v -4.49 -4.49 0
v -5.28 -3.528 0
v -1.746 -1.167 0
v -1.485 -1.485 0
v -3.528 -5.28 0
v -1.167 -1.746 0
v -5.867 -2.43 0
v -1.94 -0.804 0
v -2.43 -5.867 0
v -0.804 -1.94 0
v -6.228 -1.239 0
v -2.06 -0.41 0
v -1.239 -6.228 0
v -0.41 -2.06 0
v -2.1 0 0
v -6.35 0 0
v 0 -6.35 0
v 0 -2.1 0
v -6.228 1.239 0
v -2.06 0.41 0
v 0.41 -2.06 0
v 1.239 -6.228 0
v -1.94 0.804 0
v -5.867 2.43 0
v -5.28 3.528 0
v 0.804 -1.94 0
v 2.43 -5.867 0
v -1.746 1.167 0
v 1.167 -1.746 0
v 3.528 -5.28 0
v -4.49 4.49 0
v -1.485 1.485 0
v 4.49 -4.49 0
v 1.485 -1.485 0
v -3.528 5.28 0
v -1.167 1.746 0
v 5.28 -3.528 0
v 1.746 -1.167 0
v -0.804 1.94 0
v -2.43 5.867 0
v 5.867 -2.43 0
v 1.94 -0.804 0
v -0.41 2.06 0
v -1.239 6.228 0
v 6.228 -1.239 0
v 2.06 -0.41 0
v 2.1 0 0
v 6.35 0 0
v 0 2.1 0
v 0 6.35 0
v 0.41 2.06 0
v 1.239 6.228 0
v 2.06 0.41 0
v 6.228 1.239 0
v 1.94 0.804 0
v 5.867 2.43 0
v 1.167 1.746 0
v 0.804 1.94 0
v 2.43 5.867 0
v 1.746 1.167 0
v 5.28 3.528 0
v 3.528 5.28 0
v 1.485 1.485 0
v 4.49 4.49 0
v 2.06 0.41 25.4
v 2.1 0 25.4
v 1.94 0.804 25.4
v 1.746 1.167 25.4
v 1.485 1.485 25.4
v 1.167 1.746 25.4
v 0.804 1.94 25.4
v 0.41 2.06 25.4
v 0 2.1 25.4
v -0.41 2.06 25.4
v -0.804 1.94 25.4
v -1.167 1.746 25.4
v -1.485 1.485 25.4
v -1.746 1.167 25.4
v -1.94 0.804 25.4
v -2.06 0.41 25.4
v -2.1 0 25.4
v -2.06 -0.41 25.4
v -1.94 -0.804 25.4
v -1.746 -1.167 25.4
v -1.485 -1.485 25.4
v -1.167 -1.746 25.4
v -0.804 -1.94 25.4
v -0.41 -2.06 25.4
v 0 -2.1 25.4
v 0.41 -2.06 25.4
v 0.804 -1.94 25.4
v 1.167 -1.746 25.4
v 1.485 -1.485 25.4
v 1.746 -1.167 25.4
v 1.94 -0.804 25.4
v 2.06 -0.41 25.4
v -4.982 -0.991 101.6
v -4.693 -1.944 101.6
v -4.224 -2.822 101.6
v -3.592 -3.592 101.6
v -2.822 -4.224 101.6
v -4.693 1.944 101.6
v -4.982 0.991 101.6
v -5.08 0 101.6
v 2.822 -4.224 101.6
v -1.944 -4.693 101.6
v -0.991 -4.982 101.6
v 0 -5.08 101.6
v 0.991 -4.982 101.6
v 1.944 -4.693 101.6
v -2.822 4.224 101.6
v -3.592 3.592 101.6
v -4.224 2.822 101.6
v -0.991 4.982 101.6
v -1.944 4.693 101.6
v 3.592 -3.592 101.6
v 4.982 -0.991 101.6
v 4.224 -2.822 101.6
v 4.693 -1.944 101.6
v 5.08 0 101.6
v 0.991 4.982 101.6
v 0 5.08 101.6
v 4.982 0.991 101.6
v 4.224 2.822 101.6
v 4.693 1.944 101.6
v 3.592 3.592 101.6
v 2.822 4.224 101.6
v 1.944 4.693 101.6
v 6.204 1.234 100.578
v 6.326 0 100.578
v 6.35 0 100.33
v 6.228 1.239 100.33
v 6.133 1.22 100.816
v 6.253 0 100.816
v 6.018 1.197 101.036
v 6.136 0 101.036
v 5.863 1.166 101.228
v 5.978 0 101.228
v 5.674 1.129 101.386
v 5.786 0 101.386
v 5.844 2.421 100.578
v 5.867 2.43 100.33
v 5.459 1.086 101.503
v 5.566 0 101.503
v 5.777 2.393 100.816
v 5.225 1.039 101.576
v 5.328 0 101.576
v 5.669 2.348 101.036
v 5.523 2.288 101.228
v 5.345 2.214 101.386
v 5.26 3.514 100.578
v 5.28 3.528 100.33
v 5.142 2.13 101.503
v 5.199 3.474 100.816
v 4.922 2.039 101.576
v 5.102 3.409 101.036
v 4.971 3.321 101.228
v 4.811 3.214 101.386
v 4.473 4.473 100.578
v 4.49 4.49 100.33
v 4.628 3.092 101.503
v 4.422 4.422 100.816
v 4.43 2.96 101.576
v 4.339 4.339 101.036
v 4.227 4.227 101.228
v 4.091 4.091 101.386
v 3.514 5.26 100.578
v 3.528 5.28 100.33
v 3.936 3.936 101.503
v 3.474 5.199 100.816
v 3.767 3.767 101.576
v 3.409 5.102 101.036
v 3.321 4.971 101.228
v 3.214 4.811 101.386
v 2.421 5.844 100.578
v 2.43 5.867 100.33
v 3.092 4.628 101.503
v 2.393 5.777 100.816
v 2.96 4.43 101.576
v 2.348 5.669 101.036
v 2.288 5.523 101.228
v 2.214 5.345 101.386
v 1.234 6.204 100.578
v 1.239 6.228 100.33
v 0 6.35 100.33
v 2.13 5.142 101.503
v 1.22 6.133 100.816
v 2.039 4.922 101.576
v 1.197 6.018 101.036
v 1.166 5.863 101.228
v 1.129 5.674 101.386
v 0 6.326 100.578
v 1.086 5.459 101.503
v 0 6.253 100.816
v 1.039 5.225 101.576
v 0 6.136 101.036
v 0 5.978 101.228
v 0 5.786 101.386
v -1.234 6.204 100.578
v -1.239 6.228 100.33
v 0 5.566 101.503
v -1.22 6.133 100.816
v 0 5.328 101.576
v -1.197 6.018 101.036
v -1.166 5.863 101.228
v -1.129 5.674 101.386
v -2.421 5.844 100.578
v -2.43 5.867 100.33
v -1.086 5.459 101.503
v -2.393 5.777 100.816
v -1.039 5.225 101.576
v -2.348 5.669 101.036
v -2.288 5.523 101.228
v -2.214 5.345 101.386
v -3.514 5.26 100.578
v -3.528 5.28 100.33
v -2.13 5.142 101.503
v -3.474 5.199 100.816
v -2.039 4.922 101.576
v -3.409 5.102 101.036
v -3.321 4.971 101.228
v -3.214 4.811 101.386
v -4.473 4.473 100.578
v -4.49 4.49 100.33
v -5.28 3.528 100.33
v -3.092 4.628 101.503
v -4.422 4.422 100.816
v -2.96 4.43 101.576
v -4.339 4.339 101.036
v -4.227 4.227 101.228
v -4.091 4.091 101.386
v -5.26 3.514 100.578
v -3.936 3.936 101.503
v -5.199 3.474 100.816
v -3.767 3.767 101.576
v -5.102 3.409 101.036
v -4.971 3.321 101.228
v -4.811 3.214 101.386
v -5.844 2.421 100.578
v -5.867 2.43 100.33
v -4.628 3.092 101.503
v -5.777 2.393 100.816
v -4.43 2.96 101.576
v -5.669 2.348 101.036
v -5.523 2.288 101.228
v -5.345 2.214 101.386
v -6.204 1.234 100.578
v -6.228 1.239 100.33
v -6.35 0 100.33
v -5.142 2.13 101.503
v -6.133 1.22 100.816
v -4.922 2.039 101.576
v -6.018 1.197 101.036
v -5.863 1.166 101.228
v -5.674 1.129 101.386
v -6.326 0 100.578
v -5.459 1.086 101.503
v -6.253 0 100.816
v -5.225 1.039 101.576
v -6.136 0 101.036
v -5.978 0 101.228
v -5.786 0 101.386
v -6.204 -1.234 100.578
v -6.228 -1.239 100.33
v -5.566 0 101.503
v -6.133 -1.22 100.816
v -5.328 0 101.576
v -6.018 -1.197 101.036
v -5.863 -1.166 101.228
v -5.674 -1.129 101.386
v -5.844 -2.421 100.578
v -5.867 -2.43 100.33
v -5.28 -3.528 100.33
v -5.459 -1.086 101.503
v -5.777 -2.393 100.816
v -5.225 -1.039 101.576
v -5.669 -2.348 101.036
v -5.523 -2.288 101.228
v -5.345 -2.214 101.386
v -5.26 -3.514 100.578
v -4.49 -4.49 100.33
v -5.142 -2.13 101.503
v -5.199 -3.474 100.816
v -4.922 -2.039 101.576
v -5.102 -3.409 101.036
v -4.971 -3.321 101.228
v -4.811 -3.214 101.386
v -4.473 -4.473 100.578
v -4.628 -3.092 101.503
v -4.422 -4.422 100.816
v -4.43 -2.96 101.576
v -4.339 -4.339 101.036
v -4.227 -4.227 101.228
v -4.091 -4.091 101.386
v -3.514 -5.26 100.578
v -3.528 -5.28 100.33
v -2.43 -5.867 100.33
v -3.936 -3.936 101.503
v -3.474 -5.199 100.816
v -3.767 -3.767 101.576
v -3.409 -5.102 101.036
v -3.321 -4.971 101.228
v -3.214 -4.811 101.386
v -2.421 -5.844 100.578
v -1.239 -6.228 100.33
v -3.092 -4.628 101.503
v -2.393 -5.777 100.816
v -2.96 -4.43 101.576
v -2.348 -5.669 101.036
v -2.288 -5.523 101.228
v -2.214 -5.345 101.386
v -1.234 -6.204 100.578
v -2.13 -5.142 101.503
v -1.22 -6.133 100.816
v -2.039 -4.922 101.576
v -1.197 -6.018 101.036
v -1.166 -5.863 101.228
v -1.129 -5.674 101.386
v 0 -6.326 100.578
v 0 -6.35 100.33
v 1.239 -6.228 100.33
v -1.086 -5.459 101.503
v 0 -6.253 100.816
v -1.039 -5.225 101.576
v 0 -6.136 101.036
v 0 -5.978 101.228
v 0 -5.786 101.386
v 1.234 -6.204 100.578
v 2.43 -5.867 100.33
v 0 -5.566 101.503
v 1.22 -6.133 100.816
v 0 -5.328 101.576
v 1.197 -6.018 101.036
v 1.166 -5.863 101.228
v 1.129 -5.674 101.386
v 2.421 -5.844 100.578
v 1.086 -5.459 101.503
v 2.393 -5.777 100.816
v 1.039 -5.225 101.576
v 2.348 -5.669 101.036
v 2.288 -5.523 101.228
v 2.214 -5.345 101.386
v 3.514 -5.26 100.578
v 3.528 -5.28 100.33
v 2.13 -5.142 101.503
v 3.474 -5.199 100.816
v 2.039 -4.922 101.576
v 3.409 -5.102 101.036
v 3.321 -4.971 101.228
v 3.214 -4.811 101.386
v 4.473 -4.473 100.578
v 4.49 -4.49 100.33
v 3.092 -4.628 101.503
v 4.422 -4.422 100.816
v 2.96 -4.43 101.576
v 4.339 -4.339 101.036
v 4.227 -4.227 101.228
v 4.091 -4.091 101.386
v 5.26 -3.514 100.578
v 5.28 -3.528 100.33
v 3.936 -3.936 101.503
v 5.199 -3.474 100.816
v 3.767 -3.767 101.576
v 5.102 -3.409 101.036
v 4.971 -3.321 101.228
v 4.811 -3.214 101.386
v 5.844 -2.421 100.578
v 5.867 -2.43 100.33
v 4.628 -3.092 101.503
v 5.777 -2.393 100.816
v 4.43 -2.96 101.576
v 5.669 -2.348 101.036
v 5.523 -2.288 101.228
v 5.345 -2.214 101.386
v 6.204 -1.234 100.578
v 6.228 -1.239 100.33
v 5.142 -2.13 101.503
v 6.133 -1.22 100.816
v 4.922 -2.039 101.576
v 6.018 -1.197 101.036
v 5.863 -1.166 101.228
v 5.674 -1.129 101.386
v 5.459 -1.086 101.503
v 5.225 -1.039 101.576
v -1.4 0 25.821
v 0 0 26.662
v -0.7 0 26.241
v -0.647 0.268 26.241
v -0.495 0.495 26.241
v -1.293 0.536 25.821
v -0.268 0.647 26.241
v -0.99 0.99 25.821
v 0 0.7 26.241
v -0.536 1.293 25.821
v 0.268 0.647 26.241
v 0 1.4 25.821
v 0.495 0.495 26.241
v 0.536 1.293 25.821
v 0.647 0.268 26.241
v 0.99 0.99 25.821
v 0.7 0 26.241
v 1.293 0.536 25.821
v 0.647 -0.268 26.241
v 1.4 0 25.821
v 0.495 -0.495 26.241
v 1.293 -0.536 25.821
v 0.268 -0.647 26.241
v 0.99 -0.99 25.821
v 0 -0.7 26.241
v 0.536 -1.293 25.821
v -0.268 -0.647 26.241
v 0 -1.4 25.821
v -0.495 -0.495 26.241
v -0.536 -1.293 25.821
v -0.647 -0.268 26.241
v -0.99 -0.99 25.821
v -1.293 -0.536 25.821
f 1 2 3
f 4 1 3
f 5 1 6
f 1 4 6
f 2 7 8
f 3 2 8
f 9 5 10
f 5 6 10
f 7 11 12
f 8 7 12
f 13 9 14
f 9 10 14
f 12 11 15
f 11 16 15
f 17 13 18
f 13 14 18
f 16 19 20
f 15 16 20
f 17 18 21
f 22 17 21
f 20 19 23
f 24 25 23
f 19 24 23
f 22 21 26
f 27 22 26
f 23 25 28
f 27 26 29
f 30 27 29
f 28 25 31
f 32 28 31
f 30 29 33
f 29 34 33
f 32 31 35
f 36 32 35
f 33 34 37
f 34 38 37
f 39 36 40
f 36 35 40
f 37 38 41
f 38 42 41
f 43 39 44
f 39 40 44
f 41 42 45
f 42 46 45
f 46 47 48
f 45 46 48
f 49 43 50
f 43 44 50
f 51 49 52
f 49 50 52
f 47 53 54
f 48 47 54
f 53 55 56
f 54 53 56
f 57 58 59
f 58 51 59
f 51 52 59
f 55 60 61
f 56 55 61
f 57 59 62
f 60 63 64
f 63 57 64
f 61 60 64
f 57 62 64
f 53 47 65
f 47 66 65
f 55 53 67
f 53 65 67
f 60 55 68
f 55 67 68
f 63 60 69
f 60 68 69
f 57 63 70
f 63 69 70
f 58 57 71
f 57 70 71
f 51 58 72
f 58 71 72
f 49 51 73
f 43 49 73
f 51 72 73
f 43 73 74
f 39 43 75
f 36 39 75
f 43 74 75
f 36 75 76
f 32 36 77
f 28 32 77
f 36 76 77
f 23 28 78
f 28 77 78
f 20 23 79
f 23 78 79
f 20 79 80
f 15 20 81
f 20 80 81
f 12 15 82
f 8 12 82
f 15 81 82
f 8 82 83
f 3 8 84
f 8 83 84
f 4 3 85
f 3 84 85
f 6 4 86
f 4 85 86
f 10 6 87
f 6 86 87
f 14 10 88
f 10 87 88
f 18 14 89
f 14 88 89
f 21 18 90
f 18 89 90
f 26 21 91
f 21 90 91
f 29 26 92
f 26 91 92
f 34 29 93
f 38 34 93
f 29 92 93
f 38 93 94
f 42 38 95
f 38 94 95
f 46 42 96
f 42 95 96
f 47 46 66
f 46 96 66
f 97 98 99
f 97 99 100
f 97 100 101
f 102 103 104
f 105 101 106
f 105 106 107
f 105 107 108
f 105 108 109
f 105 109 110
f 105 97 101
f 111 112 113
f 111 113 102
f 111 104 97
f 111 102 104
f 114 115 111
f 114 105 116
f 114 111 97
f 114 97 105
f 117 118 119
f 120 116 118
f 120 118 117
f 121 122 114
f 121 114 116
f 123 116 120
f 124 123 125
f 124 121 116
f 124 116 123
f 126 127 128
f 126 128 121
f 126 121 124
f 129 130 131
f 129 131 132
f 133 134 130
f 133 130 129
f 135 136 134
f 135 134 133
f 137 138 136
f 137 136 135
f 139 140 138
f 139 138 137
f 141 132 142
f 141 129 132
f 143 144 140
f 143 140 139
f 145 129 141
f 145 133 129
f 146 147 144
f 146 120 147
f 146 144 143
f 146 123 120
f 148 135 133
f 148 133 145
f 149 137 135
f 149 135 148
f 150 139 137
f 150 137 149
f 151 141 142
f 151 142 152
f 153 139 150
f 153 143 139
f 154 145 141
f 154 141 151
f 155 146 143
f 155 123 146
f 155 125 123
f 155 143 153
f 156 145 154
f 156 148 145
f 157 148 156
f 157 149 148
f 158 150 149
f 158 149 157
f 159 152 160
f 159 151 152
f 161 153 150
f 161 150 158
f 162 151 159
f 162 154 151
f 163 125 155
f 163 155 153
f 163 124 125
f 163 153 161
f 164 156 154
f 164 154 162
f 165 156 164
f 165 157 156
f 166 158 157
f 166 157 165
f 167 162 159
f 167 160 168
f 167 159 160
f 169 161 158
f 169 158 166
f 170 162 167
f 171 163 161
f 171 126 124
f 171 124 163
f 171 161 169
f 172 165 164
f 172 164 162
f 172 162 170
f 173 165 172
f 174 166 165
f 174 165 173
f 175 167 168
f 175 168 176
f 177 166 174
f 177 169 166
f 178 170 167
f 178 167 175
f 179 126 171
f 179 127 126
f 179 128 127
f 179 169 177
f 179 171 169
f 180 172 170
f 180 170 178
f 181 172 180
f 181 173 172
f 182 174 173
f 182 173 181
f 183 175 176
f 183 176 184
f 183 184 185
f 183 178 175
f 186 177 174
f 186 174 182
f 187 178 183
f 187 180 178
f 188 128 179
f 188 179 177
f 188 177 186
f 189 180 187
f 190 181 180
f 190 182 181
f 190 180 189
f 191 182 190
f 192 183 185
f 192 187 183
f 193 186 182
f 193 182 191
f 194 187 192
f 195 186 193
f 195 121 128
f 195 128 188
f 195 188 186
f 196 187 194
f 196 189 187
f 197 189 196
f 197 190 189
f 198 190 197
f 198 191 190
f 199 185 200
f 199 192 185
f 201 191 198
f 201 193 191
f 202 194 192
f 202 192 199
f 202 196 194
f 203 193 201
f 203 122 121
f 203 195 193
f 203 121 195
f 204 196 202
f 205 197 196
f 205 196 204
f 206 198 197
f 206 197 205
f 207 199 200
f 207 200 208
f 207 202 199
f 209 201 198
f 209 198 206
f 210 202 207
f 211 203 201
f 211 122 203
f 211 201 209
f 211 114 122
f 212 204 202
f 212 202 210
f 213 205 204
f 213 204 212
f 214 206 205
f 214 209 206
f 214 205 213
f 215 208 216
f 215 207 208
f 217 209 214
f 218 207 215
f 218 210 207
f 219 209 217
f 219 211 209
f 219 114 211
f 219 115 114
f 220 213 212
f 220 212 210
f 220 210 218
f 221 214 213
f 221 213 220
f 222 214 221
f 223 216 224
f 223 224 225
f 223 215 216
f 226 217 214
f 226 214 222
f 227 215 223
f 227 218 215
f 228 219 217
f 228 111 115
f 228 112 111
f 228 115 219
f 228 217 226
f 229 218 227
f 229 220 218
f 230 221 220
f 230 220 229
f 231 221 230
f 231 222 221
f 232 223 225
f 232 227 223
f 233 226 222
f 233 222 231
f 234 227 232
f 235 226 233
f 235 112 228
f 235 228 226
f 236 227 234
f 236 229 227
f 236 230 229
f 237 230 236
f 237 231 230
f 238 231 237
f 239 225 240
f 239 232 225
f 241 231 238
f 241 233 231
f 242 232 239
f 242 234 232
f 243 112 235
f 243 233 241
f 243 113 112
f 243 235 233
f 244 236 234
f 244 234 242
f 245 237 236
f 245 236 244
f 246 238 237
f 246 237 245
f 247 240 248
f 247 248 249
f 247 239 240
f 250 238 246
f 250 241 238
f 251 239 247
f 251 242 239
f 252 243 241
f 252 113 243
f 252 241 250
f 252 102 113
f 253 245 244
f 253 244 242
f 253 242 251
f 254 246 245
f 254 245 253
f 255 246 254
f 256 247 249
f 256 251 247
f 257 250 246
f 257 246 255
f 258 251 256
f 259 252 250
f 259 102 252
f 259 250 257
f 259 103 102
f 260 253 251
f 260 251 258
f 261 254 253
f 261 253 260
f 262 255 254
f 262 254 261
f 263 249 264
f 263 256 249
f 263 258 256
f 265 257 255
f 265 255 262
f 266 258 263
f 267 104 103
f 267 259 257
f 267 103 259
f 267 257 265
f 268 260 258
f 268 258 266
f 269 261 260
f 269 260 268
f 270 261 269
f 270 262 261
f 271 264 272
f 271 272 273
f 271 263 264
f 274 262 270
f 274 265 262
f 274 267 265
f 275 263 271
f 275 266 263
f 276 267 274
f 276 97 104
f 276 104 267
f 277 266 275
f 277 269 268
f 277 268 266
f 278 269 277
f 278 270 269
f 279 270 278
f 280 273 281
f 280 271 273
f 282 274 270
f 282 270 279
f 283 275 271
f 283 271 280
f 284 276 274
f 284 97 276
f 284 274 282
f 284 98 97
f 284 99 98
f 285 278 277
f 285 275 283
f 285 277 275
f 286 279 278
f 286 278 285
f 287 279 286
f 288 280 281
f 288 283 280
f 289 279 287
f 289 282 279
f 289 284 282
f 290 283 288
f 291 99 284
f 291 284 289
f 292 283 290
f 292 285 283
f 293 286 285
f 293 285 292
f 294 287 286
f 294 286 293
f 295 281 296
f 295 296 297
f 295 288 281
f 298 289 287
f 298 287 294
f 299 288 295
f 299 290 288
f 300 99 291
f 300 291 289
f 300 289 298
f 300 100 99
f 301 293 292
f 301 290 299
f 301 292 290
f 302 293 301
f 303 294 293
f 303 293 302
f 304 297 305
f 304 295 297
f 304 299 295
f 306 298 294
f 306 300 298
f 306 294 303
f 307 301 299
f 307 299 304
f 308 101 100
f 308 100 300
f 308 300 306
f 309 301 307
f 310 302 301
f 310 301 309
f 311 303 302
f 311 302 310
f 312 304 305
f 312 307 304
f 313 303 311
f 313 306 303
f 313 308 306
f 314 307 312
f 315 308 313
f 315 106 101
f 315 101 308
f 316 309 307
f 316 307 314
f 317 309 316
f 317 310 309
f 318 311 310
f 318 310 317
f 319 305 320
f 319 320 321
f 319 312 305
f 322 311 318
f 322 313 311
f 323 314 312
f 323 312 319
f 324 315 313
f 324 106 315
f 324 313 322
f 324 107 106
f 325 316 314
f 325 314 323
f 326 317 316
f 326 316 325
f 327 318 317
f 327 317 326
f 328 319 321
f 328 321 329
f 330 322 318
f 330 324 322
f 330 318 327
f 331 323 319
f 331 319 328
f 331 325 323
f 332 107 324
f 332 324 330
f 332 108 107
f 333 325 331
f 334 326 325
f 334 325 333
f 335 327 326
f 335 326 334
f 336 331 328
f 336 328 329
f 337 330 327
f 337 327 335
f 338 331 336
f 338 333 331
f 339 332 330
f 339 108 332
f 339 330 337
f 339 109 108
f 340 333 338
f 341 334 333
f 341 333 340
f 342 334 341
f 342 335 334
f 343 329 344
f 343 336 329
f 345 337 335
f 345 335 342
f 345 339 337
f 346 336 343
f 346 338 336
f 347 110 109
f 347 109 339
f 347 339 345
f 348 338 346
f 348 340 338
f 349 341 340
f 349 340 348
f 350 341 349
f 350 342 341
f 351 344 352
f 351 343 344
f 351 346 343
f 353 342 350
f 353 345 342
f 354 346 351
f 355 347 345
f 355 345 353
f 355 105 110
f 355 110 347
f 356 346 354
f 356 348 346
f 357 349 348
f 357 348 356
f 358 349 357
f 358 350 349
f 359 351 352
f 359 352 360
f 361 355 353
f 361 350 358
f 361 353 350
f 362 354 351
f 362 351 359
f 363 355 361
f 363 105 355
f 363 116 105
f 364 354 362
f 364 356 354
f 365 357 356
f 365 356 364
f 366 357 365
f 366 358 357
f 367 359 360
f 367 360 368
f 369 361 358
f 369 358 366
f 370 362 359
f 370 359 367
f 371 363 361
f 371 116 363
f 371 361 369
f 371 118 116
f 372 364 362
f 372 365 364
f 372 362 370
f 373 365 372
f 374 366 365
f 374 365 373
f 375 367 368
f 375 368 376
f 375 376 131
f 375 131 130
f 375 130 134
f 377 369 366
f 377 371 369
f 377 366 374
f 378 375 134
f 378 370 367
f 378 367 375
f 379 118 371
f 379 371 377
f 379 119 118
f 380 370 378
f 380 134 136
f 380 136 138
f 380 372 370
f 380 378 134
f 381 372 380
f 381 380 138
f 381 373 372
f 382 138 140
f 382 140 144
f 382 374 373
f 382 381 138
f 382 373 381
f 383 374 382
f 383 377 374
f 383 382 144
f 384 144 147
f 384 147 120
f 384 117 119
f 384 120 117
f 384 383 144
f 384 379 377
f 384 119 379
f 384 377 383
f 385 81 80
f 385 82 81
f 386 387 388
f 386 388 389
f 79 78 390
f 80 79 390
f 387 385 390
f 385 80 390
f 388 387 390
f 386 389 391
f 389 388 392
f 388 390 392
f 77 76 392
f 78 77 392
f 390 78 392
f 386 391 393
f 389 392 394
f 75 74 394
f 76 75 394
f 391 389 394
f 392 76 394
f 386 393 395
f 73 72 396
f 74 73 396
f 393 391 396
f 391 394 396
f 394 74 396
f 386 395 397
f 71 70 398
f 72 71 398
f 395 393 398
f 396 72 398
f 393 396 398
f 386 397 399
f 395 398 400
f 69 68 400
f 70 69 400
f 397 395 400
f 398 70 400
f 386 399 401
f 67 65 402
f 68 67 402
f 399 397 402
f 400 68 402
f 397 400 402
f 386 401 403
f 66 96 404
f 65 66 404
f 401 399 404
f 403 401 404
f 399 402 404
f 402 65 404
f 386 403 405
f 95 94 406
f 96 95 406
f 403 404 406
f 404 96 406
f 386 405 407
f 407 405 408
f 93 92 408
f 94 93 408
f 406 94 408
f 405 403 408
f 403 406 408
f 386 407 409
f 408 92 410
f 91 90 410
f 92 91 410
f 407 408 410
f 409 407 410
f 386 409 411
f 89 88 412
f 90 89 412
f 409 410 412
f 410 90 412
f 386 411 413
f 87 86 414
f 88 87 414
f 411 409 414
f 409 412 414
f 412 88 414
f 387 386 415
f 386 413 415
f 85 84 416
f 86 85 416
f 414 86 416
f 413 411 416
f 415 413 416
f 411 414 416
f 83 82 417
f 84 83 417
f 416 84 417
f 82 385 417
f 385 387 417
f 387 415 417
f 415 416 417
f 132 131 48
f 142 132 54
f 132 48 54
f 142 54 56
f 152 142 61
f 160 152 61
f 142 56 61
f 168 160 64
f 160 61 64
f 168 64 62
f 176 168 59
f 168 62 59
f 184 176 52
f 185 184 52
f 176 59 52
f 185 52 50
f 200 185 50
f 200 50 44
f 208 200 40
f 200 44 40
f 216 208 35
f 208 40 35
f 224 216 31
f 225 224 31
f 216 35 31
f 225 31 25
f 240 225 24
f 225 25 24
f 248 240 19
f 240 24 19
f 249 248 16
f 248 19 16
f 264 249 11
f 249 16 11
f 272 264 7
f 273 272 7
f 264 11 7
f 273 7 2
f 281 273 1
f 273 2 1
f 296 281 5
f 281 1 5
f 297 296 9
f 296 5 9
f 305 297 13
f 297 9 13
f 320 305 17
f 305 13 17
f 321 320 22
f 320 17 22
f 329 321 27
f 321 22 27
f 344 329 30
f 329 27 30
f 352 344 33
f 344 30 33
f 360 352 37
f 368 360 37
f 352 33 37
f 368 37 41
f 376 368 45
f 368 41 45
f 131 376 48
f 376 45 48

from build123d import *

# Parameters (mm, degrees)
SKETCH1_R                 = 6.35
BOSS_EXTRUDE1_DEPTH       = 101.6
M5X0_8_TAPPED_HOLE1_D     = 4.2
M5X0_8_TAPPED_HOLE1_DEPTH = 25.4
M5X0_8_TAPPED_HOLE1_TIP   = 1.2618073
FILLET1_R                 = 1.27


with BuildPart() as part:
    # Sketch1 → Boss-Extrude1 (new body)
    with BuildSketch(Plane.XY):
        Circle(SKETCH1_R)
    extrude(amount=BOSS_EXTRUDE1_DEPTH)

    # M5x0.8 Tapped Hole1
    with Locations(Plane(origin=(0, 0, 0), x_dir=(-1, 0, 0), z_dir=(0, 0, -1))):
        with Locations((0, 0)):
            Hole(M5X0_8_TAPPED_HOLE1_D / 2, depth=M5X0_8_TAPPED_HOLE1_DEPTH)
            with Locations((0, 0, -(M5X0_8_TAPPED_HOLE1_DEPTH + M5X0_8_TAPPED_HOLE1_TIP / 2))):  # 118° drill point
                Cone(0, M5X0_8_TAPPED_HOLE1_D / 2, M5X0_8_TAPPED_HOLE1_TIP, mode=Mode.SUBTRACT)

    # Fillet1
    fillet1_edges = [part.edges().sort_by_distance(p)[0] for p in [
        (-6.35, 0, 101.6),
    ]]
    fillet(fillet1_edges, radius=FILLET1_R)


solid = part.part
